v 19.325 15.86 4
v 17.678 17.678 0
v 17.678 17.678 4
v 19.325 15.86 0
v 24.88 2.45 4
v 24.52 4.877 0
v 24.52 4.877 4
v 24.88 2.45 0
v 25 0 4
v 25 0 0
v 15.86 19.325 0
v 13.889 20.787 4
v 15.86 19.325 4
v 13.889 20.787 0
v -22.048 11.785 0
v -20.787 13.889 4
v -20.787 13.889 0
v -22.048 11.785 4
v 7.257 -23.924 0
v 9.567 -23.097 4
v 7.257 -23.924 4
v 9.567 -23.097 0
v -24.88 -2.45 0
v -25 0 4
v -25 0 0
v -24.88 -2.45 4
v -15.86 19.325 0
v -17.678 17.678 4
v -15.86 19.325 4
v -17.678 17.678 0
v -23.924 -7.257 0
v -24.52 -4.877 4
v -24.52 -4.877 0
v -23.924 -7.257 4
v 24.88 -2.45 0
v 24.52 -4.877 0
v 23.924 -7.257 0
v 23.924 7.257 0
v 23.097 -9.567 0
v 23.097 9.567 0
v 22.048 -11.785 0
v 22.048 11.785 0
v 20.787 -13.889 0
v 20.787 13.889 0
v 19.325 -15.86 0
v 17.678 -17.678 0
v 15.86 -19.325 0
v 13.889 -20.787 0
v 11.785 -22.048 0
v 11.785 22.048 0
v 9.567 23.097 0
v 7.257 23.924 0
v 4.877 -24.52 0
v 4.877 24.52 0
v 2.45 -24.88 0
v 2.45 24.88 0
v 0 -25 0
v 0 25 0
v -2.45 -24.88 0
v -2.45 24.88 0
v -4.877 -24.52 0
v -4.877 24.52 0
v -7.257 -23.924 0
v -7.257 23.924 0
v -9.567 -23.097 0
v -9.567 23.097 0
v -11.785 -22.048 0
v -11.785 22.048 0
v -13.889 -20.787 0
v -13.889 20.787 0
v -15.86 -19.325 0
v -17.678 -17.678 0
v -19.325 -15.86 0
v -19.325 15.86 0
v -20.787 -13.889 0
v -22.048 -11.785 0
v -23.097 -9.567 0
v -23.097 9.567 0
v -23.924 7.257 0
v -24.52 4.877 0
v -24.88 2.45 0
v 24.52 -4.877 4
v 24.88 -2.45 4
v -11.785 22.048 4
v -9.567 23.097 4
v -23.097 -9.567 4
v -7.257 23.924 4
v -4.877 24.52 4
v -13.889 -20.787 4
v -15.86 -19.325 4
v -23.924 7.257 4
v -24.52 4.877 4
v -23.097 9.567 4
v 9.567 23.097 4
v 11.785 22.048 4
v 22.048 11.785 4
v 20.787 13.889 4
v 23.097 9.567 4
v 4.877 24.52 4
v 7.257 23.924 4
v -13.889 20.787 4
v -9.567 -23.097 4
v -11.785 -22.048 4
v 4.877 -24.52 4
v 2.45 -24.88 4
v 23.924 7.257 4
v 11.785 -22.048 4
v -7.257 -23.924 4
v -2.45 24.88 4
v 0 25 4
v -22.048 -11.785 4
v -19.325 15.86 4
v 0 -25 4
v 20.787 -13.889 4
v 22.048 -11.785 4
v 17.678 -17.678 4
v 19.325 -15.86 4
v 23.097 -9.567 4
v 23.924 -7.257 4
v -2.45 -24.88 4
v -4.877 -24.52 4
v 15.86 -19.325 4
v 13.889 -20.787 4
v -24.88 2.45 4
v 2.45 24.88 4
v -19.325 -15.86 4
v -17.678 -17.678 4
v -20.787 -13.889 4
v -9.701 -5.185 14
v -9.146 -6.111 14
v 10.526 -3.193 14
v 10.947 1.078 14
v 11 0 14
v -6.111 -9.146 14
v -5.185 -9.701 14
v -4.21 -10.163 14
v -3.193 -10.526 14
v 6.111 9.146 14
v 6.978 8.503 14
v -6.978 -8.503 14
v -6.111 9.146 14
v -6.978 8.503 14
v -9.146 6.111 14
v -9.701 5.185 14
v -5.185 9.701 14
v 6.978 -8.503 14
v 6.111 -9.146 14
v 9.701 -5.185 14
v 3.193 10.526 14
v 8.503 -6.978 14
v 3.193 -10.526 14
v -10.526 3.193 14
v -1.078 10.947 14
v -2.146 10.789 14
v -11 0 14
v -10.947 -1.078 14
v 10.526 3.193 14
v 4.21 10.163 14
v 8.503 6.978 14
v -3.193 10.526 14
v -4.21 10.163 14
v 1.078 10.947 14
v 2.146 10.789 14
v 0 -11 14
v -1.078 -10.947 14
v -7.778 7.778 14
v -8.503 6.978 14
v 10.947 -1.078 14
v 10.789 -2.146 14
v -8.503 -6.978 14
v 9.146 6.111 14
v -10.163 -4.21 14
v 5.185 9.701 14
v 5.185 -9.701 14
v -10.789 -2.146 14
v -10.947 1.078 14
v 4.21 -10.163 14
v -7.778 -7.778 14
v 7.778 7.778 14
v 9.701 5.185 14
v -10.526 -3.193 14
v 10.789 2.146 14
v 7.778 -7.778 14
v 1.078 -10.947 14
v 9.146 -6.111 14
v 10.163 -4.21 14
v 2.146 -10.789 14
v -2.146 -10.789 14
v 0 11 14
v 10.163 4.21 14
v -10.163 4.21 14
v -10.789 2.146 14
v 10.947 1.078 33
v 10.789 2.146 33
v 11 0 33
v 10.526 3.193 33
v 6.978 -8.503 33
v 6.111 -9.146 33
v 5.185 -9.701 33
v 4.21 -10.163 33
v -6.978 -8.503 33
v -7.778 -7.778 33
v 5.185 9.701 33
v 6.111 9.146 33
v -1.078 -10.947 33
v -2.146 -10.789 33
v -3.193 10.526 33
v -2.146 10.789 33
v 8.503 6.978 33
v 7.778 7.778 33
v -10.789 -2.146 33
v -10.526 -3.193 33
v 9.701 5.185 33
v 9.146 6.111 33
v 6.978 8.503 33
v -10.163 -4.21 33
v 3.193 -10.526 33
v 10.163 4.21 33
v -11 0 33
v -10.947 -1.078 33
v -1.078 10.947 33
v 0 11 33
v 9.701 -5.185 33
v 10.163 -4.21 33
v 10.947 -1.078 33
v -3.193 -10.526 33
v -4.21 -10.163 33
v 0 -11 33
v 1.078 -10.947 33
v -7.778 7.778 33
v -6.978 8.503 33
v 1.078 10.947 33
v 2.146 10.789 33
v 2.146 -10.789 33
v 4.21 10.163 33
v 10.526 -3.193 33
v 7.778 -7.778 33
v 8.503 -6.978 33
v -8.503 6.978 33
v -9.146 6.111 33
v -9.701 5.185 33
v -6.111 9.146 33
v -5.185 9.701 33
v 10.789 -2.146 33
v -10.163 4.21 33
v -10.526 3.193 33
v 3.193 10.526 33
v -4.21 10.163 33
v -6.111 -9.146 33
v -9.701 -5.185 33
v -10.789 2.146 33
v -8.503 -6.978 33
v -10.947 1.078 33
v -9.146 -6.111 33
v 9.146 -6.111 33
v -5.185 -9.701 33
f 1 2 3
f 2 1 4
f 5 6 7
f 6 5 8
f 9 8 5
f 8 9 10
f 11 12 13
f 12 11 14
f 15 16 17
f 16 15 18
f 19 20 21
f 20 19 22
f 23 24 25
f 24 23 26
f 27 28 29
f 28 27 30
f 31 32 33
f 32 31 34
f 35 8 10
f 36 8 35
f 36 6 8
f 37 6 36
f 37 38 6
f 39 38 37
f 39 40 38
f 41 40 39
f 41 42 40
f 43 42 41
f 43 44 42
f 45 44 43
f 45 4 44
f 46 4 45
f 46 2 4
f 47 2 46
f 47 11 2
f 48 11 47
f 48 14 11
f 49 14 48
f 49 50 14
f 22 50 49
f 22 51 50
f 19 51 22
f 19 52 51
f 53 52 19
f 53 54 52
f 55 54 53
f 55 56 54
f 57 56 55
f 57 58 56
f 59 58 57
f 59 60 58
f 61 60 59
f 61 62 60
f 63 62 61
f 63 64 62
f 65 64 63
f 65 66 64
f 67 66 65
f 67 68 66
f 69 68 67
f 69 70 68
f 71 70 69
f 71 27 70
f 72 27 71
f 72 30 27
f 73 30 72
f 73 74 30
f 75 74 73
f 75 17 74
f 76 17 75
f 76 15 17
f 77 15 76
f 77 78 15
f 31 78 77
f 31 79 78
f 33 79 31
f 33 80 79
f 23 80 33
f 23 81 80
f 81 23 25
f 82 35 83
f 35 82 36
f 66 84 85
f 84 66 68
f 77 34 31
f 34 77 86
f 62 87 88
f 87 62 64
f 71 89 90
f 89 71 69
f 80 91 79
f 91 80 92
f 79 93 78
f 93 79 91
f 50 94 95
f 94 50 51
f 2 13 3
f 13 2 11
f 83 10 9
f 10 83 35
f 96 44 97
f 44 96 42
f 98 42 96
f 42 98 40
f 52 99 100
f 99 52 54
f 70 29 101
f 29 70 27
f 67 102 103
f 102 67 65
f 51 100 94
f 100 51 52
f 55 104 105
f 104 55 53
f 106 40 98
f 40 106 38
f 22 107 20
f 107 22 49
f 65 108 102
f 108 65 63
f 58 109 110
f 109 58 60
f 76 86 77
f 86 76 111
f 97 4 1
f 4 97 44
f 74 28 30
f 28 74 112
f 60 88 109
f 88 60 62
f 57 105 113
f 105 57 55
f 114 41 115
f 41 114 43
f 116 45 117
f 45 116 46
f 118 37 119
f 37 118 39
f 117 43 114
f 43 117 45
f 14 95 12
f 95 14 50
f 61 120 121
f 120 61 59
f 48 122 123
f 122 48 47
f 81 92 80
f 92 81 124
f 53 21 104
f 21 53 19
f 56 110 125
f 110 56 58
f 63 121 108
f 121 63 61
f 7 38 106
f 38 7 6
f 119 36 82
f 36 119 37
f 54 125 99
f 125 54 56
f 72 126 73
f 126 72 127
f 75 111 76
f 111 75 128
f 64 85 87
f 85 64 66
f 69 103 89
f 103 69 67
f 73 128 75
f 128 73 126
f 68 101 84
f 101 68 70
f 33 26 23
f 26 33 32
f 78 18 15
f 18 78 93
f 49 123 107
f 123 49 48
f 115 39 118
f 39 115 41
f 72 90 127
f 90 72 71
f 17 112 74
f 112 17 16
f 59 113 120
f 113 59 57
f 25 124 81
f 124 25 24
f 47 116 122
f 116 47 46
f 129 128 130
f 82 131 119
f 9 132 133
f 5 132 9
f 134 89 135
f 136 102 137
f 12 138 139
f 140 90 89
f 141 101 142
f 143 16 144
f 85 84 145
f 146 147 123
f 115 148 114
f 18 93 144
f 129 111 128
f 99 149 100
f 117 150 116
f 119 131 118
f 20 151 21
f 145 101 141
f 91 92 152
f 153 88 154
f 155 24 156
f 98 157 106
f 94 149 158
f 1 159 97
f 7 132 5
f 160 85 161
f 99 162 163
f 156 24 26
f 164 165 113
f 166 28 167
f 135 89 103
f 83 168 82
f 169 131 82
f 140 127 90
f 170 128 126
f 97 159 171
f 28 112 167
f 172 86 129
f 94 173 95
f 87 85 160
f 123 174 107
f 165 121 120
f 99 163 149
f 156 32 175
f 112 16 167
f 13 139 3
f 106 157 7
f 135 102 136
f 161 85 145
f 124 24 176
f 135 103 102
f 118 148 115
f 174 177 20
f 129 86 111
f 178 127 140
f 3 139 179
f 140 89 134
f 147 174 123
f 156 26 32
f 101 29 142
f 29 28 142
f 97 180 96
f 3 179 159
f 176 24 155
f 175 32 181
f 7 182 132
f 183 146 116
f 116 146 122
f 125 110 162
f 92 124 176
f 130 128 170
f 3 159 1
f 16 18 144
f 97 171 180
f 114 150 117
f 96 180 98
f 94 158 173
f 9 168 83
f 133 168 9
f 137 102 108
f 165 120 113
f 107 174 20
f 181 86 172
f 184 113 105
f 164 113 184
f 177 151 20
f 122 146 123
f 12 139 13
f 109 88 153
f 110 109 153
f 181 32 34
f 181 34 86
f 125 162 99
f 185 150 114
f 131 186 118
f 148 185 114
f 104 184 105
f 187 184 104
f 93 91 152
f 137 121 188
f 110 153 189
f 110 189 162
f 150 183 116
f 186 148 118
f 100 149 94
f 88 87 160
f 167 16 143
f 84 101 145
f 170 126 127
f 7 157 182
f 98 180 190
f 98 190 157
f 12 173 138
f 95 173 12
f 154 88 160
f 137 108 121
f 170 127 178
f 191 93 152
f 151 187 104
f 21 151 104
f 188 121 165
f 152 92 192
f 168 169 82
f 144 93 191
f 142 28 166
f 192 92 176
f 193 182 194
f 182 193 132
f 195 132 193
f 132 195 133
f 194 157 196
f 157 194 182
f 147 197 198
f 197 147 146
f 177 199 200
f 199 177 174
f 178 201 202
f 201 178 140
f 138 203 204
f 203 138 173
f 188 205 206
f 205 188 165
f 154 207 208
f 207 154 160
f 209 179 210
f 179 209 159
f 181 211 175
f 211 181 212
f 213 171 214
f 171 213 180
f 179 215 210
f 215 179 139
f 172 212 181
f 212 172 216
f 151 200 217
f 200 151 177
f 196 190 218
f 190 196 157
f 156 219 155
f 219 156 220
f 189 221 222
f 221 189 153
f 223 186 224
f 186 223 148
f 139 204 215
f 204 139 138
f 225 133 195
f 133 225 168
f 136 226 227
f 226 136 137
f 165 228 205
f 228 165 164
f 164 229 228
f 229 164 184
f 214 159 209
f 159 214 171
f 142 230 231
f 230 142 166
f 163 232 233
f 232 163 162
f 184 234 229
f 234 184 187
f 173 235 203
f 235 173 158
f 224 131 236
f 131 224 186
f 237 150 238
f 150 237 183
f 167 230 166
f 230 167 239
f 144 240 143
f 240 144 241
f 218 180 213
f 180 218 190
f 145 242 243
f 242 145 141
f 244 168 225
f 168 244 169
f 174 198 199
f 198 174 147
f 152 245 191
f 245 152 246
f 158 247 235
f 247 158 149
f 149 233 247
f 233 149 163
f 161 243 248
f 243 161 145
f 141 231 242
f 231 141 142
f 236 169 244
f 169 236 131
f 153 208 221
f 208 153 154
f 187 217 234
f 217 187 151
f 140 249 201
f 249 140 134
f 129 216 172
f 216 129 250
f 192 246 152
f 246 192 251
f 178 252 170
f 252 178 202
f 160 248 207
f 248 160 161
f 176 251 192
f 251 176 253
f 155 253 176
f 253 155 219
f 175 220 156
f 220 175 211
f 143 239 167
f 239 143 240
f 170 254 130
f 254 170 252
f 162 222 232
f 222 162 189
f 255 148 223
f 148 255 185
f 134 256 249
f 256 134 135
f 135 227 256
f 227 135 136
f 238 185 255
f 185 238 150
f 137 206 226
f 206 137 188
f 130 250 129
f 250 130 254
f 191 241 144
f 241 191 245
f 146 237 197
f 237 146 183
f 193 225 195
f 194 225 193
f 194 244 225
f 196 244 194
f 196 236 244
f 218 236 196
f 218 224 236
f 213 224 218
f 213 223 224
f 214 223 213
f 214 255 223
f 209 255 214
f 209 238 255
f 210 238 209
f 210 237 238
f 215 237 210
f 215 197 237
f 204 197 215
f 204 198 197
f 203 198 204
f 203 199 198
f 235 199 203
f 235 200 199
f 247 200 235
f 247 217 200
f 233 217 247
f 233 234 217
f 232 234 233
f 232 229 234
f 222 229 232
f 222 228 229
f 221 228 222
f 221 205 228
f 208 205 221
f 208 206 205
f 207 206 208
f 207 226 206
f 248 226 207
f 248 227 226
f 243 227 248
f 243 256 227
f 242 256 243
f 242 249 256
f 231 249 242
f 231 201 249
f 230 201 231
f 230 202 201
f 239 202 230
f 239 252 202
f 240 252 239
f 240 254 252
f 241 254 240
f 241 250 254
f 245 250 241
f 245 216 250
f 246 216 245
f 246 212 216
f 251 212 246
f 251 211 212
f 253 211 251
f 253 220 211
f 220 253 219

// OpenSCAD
// Dimensions (mm) - measured with calipers
base_dia = 50;
base_h = 4;
cone_top_dia = 50;
cone_bot_dia = 22;
cone_h = 10; // z=4 to z=14
col_dia = 22;
col_h = 19; // z=14 to z=33
seat_dia = 11;
seat_h = 10; // z=33 down to z=23
tip_dia = 3;
tip_z = 6;
window_w = 4;
window_z1 = 18;
window_z2 = 30;

$fn = 64;

// Base disc
translate([0, 0, 0])
  cylinder(h = base_h, r = base_dia / 2, center = false);

// Cone
translate([0, 0, base_h])
  cylinder(h = cone_h, r1 = cone_top_dia / 2, r2 = cone_bot_dia / 2, center = false);

// Column
translate([0, 0, base_h + cone_h])
  cylinder(h = col_h, r = col_dia / 2, center = false);

// Tube seat (cylindrical part)
translate([0, 0, base_h + cone_h + col_h - seat_h])
  cylinder(h = seat_h, r = seat_dia / 2, center = false);

// Tube seat (conical tip part)
// From z=23 down to z=6, diameter goes from 11 to 3
cone_seat_h = 23 - tip_z; // 17 mm
translate([0, 0, tip_z])
  cylinder(h = cone_seat_h, r1 = tip_dia / 2, r2 = seat_dia / 2, center = false);

// Viewing window cut
// Cut through the column wall on +X side
// Window is 4 mm wide in Y, from z=18 to z=30
// It goes from the seat (inner radius) to the outside (outer radius)
// Inner radius = seat_dia/2 = 5.5 mm
// Outer radius = col_dia/2 = 11 mm
// So the cut extends from x = 5.5 to x = 11 (and beyond to ensure clean cut)
// Centered in Y at 0, width 4 mm means Y from -2 to +2

difference() {
  // The solid part is already built above, but we need to subtract the window
  // We'll rebuild the column and seat parts here for the difference operation
  // Actually, let's use a different approach: subtract the window from the entire assembly
  
  // Rebuild the entire solid for the difference operation
  union() {
    // Base disc
    translate([0, 0, 0])
      cylinder(h = base_h, r = base_dia / 2, center = false);
    
    // Cone
    translate([0, 0, base_h])
      cylinder(h = cone_h, r1 = cone_top_dia / 2, r2 = cone_bot_dia / 2, center = false);
    
    // Column
    translate([0, 0, base_h + cone_h])
      cylinder(h = col_h, r = col_dia / 2, center = false);
    
    // Tube seat (cylindrical part)
    translate([0, 0, base_h + cone_h + col_h - seat_h])
      cylinder(h = seat_h, r = seat_dia / 2, center = false);
    
    // Tube seat (conical tip part)
    translate([0, 0, tip_z])
      cylinder(h = cone_seat_h, r1 = tip_dia / 2, r2 = seat_dia / 2, center = false);
  }
  
  // Subtract the viewing window
  // The window is on the +X side, so we place the cut box at positive X
  // It goes from the inner surface (seat_dia/2) to beyond the outer surface (col_dia/2 + 1mm)
  // Y is centered at 0, width 4 mm
  // Z from window_z1 to window_z2
  
  translate([seat_dia / 2, 0, window_z1])
    cube([col_dia / 2 - seat_dia / 2 + 1, window_w, window_z2 - window_z1 + 0.01]);
}
